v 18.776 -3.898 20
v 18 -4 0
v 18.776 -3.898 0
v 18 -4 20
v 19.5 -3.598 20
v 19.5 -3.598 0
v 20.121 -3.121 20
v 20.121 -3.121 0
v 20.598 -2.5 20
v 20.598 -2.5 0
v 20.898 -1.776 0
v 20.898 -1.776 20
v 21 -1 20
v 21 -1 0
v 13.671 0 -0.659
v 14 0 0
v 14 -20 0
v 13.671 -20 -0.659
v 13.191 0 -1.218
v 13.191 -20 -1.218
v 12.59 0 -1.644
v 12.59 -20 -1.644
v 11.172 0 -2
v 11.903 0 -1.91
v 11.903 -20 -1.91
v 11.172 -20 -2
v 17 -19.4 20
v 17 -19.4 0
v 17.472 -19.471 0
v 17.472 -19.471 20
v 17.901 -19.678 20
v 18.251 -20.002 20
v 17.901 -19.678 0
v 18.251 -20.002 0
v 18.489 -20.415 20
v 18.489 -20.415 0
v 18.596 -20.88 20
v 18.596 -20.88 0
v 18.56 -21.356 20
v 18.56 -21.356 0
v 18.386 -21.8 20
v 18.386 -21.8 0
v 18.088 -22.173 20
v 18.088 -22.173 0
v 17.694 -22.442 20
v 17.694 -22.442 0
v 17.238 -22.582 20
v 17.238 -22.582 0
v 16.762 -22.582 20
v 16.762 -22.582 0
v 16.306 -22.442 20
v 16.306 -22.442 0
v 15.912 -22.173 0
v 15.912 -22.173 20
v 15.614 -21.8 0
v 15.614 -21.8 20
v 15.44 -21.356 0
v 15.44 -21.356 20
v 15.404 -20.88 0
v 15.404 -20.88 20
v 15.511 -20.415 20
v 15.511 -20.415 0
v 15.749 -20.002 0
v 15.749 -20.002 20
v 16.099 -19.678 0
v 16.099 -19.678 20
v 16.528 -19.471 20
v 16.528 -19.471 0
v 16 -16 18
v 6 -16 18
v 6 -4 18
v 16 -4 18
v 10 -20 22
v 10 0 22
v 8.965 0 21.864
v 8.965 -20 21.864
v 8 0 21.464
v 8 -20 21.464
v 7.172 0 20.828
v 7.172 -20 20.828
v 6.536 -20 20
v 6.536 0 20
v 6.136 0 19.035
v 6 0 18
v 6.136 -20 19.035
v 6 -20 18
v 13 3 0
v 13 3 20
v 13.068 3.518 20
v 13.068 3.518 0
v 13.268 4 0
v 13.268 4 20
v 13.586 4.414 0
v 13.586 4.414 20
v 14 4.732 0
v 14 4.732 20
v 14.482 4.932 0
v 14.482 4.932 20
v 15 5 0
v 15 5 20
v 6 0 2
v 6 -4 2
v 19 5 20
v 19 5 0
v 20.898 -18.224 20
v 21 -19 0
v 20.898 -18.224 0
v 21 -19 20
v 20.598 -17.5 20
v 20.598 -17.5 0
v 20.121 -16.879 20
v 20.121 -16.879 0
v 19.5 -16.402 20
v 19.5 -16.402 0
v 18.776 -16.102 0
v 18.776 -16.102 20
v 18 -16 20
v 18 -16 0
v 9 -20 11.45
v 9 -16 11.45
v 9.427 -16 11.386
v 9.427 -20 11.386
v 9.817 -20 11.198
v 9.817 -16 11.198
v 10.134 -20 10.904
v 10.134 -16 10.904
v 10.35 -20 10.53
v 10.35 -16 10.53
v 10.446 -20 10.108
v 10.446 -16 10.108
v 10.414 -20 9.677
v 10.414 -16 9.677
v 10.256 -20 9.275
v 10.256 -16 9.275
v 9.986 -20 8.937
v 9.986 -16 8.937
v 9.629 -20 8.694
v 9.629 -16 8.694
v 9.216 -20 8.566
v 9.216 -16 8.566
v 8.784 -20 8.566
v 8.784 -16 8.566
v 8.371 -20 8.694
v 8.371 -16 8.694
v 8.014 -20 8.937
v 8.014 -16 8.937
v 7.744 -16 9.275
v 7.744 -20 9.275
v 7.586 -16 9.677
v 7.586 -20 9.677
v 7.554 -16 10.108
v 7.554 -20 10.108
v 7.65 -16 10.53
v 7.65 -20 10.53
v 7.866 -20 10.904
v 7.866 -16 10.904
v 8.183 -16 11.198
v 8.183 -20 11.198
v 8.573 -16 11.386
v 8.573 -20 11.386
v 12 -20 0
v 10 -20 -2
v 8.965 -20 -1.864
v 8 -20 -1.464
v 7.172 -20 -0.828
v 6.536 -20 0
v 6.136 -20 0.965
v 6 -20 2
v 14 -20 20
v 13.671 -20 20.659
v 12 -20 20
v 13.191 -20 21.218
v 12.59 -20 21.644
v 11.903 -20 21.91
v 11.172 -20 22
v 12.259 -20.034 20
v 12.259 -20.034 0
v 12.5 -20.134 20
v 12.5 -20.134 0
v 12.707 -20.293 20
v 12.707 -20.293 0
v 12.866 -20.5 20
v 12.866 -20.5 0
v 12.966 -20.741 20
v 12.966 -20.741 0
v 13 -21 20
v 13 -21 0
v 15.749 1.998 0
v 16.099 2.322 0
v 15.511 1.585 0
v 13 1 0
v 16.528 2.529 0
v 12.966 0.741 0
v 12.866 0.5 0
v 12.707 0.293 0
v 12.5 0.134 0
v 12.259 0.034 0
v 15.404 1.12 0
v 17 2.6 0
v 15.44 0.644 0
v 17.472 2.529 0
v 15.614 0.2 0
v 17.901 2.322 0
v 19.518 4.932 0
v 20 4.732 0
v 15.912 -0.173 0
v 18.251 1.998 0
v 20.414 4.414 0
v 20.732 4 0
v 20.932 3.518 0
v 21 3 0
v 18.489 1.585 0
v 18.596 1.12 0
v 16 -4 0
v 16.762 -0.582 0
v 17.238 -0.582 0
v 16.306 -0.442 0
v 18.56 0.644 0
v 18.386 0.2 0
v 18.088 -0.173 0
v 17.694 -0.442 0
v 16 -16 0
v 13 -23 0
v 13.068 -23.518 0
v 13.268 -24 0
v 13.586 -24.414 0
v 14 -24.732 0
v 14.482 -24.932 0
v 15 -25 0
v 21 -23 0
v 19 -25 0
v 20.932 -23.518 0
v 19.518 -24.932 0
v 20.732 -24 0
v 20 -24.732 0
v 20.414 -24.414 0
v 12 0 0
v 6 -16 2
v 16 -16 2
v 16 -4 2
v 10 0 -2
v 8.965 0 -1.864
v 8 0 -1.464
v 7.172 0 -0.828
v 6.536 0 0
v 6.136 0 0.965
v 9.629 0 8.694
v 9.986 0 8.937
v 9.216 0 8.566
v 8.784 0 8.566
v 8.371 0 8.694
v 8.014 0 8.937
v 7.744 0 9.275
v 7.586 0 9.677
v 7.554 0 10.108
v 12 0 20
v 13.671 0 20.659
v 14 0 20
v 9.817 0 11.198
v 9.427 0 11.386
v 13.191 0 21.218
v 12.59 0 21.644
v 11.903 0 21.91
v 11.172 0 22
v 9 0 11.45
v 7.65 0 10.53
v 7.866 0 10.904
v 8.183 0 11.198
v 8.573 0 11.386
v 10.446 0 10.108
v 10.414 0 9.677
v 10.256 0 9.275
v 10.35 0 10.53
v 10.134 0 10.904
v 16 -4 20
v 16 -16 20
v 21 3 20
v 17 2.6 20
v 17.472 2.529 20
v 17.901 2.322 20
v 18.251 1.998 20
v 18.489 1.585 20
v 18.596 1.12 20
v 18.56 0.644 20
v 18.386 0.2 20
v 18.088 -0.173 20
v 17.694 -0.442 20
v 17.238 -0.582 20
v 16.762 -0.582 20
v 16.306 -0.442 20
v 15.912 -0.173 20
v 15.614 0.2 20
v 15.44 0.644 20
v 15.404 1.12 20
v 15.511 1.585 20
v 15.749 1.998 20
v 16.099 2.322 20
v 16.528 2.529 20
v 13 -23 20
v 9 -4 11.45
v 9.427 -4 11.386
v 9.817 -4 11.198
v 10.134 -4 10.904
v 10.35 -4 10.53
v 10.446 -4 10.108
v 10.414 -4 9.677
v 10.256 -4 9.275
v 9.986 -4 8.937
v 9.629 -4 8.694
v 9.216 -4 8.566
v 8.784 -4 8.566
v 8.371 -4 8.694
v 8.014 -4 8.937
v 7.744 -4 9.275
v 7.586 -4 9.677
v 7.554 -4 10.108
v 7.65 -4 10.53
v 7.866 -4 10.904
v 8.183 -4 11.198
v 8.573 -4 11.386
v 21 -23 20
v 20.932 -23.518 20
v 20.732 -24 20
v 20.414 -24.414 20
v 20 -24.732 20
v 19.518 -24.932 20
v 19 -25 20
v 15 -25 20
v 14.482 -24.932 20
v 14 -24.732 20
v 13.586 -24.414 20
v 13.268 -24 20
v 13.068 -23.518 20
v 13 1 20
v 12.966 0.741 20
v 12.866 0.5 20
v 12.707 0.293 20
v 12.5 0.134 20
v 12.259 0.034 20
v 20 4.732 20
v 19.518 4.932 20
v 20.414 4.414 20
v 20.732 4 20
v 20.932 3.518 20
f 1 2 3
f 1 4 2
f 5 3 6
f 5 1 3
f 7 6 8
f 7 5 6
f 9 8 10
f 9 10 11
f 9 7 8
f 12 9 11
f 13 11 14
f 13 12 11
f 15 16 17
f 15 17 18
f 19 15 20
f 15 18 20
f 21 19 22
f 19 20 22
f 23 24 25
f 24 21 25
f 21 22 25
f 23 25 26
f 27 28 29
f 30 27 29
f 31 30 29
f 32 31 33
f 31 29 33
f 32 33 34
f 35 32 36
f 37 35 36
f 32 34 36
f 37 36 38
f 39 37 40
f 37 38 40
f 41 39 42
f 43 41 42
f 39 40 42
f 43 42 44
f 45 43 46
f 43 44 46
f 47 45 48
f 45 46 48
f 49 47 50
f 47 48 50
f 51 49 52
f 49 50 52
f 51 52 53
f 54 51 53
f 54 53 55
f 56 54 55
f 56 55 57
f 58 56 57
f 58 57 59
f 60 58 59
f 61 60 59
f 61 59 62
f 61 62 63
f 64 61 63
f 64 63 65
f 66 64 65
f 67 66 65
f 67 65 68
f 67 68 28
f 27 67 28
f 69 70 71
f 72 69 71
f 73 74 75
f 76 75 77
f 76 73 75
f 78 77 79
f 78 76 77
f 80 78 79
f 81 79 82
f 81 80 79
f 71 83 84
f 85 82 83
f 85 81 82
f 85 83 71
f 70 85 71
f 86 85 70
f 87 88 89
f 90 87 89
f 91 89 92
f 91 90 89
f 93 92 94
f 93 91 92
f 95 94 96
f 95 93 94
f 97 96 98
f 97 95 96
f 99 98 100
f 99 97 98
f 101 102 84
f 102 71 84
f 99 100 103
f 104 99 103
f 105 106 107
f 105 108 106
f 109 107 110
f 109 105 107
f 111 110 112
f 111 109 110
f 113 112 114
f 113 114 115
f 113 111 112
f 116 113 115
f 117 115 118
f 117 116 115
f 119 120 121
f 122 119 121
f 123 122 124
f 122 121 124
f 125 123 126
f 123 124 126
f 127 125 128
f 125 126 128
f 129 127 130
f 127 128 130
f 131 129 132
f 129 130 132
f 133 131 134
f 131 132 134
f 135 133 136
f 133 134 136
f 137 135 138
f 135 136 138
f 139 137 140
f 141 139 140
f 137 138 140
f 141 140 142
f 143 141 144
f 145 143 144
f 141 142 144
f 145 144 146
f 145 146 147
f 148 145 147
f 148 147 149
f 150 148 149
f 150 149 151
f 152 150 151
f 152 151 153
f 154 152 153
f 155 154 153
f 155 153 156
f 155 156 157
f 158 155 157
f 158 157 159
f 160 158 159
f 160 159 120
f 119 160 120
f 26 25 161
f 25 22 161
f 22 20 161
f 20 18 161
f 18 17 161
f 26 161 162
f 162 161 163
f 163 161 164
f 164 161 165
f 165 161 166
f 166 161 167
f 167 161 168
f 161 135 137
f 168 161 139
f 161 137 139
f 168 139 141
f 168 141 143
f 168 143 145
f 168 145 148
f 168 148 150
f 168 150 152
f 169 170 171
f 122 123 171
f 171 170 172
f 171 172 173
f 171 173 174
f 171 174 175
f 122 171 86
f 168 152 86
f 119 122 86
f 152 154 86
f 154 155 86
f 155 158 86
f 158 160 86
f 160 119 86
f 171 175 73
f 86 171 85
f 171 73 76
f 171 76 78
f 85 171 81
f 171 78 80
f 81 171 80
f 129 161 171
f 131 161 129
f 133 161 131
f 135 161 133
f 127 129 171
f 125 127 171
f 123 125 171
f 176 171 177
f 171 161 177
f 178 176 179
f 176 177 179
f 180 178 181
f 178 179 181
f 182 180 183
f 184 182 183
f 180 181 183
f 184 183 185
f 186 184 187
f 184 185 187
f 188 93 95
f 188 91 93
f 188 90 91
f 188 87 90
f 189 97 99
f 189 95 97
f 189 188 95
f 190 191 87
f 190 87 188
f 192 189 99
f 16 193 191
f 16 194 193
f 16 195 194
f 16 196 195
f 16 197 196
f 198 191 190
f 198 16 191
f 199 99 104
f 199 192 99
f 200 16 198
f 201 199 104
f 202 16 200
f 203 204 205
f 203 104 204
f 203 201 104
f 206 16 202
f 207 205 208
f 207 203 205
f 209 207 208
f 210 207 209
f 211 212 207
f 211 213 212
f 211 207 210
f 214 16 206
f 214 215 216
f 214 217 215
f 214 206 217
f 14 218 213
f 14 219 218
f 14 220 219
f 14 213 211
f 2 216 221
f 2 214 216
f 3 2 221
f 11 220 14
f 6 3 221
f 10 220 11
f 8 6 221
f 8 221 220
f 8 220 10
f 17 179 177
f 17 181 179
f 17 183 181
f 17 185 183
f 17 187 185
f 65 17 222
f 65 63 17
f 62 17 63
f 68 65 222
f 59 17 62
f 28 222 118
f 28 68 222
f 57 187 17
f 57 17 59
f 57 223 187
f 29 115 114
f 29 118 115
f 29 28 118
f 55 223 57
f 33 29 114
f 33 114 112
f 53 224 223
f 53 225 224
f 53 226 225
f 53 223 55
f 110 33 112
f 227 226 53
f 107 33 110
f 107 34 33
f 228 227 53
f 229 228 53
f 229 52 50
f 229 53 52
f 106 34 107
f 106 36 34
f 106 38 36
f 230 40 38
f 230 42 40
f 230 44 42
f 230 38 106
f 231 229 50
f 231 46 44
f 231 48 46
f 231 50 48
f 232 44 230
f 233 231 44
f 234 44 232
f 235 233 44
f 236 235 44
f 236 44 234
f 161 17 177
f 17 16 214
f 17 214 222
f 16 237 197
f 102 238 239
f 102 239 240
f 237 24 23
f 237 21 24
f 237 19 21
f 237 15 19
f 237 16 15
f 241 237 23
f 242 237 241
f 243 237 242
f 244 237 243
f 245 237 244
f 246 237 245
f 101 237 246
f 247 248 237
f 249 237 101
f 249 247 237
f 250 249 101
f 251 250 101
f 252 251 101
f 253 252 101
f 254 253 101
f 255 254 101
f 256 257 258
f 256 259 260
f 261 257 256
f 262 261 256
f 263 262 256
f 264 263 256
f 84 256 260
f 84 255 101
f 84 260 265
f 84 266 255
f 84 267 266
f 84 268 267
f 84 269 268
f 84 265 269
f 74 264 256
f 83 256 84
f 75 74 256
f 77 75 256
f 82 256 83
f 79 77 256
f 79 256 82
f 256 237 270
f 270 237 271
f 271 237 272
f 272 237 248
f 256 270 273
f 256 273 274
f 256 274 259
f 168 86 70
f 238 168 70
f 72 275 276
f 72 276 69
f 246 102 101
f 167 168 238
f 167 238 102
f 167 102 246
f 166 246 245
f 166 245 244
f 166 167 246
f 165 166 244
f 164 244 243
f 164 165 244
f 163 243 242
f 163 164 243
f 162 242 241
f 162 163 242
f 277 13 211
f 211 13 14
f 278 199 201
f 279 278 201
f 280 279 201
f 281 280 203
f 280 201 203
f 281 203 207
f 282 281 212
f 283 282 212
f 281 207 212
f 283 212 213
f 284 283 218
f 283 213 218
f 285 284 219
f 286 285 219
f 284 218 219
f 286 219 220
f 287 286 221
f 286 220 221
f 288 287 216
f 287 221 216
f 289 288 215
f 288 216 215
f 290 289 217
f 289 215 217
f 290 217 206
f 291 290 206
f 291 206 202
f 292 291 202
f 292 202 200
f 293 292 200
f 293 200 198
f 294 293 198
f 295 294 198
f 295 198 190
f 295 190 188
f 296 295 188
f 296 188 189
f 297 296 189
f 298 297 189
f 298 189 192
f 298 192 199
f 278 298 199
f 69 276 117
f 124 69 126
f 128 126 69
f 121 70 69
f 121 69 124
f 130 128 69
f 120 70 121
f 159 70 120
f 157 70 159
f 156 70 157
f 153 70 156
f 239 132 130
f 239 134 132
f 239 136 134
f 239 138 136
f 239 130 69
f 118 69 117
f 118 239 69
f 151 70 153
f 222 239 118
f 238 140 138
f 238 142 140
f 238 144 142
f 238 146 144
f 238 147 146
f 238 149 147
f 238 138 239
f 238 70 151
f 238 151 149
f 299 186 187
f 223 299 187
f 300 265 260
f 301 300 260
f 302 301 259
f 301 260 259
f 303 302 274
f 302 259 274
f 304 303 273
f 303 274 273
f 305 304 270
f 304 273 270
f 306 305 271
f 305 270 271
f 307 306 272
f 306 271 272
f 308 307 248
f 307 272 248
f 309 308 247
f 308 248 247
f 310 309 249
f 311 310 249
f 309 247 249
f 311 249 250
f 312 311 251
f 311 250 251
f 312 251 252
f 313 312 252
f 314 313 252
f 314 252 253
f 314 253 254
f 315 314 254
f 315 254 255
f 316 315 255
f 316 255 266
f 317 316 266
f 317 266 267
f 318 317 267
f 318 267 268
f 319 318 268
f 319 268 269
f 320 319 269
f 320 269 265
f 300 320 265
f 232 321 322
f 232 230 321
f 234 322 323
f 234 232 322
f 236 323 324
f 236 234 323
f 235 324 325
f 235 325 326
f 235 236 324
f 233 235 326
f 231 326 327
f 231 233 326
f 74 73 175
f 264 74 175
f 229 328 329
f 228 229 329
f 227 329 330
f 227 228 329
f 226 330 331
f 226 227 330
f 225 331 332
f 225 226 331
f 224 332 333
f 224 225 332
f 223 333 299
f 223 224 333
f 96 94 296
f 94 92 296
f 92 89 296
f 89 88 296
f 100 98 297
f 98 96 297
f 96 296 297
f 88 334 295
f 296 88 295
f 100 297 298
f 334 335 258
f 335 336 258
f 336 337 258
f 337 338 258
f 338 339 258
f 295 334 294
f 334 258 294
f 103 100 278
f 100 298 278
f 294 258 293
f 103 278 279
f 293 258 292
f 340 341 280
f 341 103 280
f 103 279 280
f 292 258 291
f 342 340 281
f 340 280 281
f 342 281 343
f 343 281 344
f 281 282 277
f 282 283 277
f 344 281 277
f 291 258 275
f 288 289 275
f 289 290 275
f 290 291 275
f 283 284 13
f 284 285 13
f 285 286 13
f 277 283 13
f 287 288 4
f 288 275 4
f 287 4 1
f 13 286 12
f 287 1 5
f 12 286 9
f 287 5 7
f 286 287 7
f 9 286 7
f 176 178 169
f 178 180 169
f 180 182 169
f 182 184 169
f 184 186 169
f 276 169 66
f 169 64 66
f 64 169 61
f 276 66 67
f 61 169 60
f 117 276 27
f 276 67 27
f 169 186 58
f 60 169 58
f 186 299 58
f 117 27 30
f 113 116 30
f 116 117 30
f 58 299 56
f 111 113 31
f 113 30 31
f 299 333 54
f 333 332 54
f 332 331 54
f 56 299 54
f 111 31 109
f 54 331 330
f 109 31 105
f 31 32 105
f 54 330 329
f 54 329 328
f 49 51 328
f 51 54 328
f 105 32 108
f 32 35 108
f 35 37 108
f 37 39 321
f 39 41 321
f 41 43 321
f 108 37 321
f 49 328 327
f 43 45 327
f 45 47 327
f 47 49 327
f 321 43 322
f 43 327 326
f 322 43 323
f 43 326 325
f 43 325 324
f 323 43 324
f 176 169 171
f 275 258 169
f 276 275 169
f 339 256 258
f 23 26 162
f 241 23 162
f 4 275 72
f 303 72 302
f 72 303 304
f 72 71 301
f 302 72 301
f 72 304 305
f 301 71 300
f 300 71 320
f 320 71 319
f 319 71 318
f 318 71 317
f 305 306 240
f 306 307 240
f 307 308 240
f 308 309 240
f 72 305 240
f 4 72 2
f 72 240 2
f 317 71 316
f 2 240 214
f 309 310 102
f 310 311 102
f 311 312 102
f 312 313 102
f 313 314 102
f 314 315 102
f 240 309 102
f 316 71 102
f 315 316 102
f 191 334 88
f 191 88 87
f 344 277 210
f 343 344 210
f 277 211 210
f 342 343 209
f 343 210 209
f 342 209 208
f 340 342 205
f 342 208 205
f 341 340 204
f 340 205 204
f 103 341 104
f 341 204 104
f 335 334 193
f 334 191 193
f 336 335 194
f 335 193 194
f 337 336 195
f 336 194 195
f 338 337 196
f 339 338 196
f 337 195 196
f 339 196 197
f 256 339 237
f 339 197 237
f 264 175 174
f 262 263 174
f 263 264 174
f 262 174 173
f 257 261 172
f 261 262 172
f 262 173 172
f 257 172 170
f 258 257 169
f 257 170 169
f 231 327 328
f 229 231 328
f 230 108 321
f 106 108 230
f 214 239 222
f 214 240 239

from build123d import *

# Parameters (mm, degrees)
SKETCH1_W           = 20
SKETCH1_H           = 20
BOSS_EXTRUDE1_DEPTH = 4
SKETCH2_R           = 3.7
CUT_EXTRUDE1_DEPTH  = 2.6
SKETCH3_R           = 2.1
CUT_EXTRUDE2_DEPTH  = 29.403520909
SKETCH4_W           = 12
SKETCH4_H           = 4
BOSS_EXTRUDE2_DEPTH = 12
SKETCH7_W           = 20
SKETCH7_H           = 4
BOSS_EXTRUDE3_DEPTH = 5
SKETCH8_W           = 8
SKETCH8_H           = 20
BOSS_EXTRUDE4_DEPTH = 5
SKETCH9_W           = 8
SKETCH9_H           = 20
BOSS_EXTRUDE5_DEPTH = 5
SKETCH10_R          = 1.6
CUT_EXTRUDE5_DEPTH  = 39.288379438
SKETCH11_W          = 30
SKETCH11_H          = 30
CUT_EXTRUDE6_DEPTH  = 6
SKETCH12_R          = 1.45
CUT_EXTRUDE7_DEPTH  = 39.288379438
SKETCH13_W          = 8
SKETCH13_H          = 20
BOSS_EXTRUDE6_DEPTH = 2
SKETCH14_W          = 8
SKETCH14_H          = 20
BOSS_EXTRUDE7_DEPTH = 2
SKETCH15_W          = 16
SKETCH15_H          = 12
CUT_EXTRUDE8_DEPTH  = 37.523964735
FILLET2_R           = 3
FILLET4_R           = 2
FILLET5_START       = -21
FILLET5_DEPTH       = 22
FILLET6_R           = 3
FILLET7_R           = 1
FILLET8_R           = 1


with BuildPart() as part:
    # Sketch1 → Boss-Extrude1 (new body)
    with BuildSketch(Plane(origin=(0, 0, 0), x_dir=(0, 0, -1), z_dir=(1, 0, 0))):
        with Locations((-10, -10)):
            Rectangle(SKETCH1_W, SKETCH1_H)
    extrude(amount=BOSS_EXTRUDE1_DEPTH)

    # Sketch2 → Cut-Extrude1 (cut)
    with BuildSketch(Plane(origin=(4, 0, 0), x_dir=(0, 0, -1), z_dir=(1, 0, 0))):
        with Locations((-10, -10)):
            Circle(SKETCH2_R)
    extrude(amount=-CUT_EXTRUDE1_DEPTH, mode=Mode.SUBTRACT)

    # Sketch3 → Cut-Extrude2 (cut, through all)
    with BuildSketch(Plane(origin=(1.4, 0, 0), x_dir=(0, 0, -1), z_dir=(1, 0, 0))):
        with Locations((-10, -10)):
            Circle(SKETCH3_R)
    extrude(amount=-CUT_EXTRUDE2_DEPTH, mode=Mode.SUBTRACT)

    # Sketch4 → Boss-Extrude2 (add)
    with BuildSketch(Plane(origin=(4, 0, 0), x_dir=(0, 0, -1), z_dir=(1, 0, 0))):
        Polygon((-20, 0), (-20, -20), (-16, -20), (-16, -16), (-16, -4), (-16, 0), align=None)
        with Locations((-10, -18)):
            Rectangle(SKETCH4_W, SKETCH4_H)
        Polygon((-4, -16), (-4, -20), (0, -20), (0, -4), (-4, -4), align=None)
        Polygon((0, 0), (-16, 0), (-16, -4), (-4, -4), (0, -4), align=None)
    extrude(amount=BOSS_EXTRUDE2_DEPTH)

    # Sketch7 → Boss-Extrude3 (add)
    with BuildSketch(Plane(origin=(16, 0, 0), x_dir=(0, 0, -1), z_dir=(1, 0, 0))):
        with Locations((-10, -18)):
            Rectangle(SKETCH7_W, SKETCH7_H)
        with Locations((-10, -2)):
            Rectangle(SKETCH7_W, SKETCH7_H)
    extrude(amount=BOSS_EXTRUDE3_DEPTH)

    # Sketch8 → Boss-Extrude4 (add)
    with BuildSketch(Plane(origin=(0, -20, 0), x_dir=(-1, 0, 0), z_dir=(0, -1, 0))):
        with Locations((-17, -10)):
            Rectangle(SKETCH8_W, SKETCH8_H)
    extrude(amount=BOSS_EXTRUDE4_DEPTH)

    # Sketch9 → Boss-Extrude5 (add)
    with BuildSketch(Plane(origin=(0, 0, 0), x_dir=(1, 0, 0), z_dir=(0, 1, 0))):
        with Locations((17, -10)):
            Rectangle(SKETCH9_W, SKETCH9_H)
    extrude(amount=BOSS_EXTRUDE5_DEPTH)

    # Sketch10 → Cut-Extrude5 (cut, through all)
    with BuildSketch(Plane(origin=(0, 0, 0), x_dir=(-1, 0, 0), z_dir=(0, 0, -1))):
        with Locations(Location((-17, 1, 0), (0, 0, 90))):
            Circle(SKETCH10_R)
        with Locations(Location((-17, -21, 0), (0, 0, 90))):
            Circle(SKETCH10_R)
    extrude(amount=-CUT_EXTRUDE5_DEPTH, mode=Mode.SUBTRACT)

    # Sketch11 → Cut-Extrude6 (cut)
    with BuildSketch(Plane.ZY):
        with Locations((15, -5)):
            Rectangle(SKETCH11_W, SKETCH11_H)
    extrude(amount=-CUT_EXTRUDE6_DEPTH, mode=Mode.SUBTRACT)

    # Sketch12 → Cut-Extrude7 (cut, through all)
    with BuildSketch(Plane(origin=(0, 0, 0), x_dir=(1, 0, 0), z_dir=(0, 1, 0))):
        with Locations(Location((9, -10, 0), (0, 0, 270))):
            Circle(SKETCH12_R)
    extrude(amount=-CUT_EXTRUDE7_DEPTH, mode=Mode.SUBTRACT)

    # Sketch13 → Boss-Extrude6 (add)
    with BuildSketch(Plane.XY.offset(20)):
        with Locations((10, -10)):
            Rectangle(SKETCH13_W, SKETCH13_H)
    extrude(amount=BOSS_EXTRUDE6_DEPTH)

    # Sketch14 → Boss-Extrude7 (add)
    with BuildSketch(Plane(origin=(0, 0, 0), x_dir=(-1, 0, 0), z_dir=(0, 0, -1))):
        with Locations((-10, -10)):
            Rectangle(SKETCH14_W, SKETCH14_H)
    extrude(amount=BOSS_EXTRUDE7_DEPTH)

    # Sketch15 → Cut-Extrude8 (cut, through all)
    with BuildSketch(Plane.ZY.offset(-6)):
        with Locations((10, -10)):
            Rectangle(SKETCH15_W, SKETCH15_H)
    extrude(amount=-CUT_EXTRUDE8_DEPTH, mode=Mode.SUBTRACT)

    # Fillet2
    fillet2_edges = [part.edges().sort_by_distance(p)[0] for p in [
        (21, -16, 10),
        (21, -4, 10),
    ]]
    fillet(fillet2_edges, radius=FILLET2_R)

    # Fillet4
    fillet4_edges = [part.edges().sort_by_distance(p)[0] for p in [
        (21, -25, 10),
        (13, -25, 10),
        (21, 5, 10),
        (13, 5, 10),
    ]]
    fillet(fillet4_edges, radius=FILLET4_R)

    # Fillet5: read off the stored shape, not the designer's step
    # Fillet5 outline → Fillet5 (cut)
    with BuildSketch(Plane(origin=(0, 0, 0), x_dir=(1, 0, 0), z_dir=(0, 1, 0)).offset(FILLET5_START)):
        with BuildLine():
            Line((6, 2), (6, -2))
            ThreePointArc((6, -2), (7.171572875, 0.828427125), (10, 2))
            Line((10, 2), (6, 2))
        make_face()
        with BuildLine():
            ThreePointArc((10, -22), (7.171572875, -20.828427125), (6, -18))
            Line((6, -18), (6, -22))
            Line((6, -22), (10, -22))
        make_face()
    extrude(amount=FILLET5_DEPTH, mode=Mode.SUBTRACT)

    # Fillet6
    # the kernel refuses this fillet: 3 mm, written as the material it takes off along each edge
    with BuildSketch(Plane(origin=(14, -27.071067812, -2), x_dir=(-1, 0, 0), z_dir=(0, 1, 0))) as fillet6_piece_1:
        with BuildLine():
            CenterArc((2.828427125, 3), FILLET6_R, 199.471220634, 70.528779366)
            Line((0, 2), (-0.056568542, 1.98))
            ThreePointArc((-0.056568542, 1.98), (-0.06, 1), (-0.06, 0))
            Line((-0.06, 0), (0, -0.06))
            Line((0, -0.06), (2.828427125, -0.06))
            Line((2.828427125, -0.06), (2.828427125, 0))
        make_face()
    extrude(amount=34.142135624, mode=Mode.SUBTRACT)
    with BuildSketch(Plane(origin=(14, -27.071067812, 22), x_dir=(0, 0, -1), z_dir=(0, 1, 0))) as fillet6_piece_2:
        with BuildLine():
            CenterArc((3, 2.828427125), FILLET6_R, 180, 70.528779366)
            Line((0, 2.828427125), (-0.06, 2.828427125))
            Line((-0.06, 2.828427125), (-0.06, 0))
            Line((-0.06, 0), (0, -0.06))
            ThreePointArc((0, -0.06), (1, -0.06), (1.98, -0.056568542))
            Line((1.98, -0.056568542), (2, 0))
        make_face()
    extrude(amount=34.142135624, mode=Mode.SUBTRACT)

    # Fillet7
    fillet7_edges = [part.edges().sort_by_distance(p)[0] for p in [
        (13, -20, 10),
    ]]
    fillet(fillet7_edges, radius=FILLET7_R)

    # Fillet8
    fillet8_edges = [part.edges().sort_by_distance(p)[0] for p in [
        (13, 0, 10),
    ]]
    fillet(fillet8_edges, radius=FILLET8_R)


solid = part.part
